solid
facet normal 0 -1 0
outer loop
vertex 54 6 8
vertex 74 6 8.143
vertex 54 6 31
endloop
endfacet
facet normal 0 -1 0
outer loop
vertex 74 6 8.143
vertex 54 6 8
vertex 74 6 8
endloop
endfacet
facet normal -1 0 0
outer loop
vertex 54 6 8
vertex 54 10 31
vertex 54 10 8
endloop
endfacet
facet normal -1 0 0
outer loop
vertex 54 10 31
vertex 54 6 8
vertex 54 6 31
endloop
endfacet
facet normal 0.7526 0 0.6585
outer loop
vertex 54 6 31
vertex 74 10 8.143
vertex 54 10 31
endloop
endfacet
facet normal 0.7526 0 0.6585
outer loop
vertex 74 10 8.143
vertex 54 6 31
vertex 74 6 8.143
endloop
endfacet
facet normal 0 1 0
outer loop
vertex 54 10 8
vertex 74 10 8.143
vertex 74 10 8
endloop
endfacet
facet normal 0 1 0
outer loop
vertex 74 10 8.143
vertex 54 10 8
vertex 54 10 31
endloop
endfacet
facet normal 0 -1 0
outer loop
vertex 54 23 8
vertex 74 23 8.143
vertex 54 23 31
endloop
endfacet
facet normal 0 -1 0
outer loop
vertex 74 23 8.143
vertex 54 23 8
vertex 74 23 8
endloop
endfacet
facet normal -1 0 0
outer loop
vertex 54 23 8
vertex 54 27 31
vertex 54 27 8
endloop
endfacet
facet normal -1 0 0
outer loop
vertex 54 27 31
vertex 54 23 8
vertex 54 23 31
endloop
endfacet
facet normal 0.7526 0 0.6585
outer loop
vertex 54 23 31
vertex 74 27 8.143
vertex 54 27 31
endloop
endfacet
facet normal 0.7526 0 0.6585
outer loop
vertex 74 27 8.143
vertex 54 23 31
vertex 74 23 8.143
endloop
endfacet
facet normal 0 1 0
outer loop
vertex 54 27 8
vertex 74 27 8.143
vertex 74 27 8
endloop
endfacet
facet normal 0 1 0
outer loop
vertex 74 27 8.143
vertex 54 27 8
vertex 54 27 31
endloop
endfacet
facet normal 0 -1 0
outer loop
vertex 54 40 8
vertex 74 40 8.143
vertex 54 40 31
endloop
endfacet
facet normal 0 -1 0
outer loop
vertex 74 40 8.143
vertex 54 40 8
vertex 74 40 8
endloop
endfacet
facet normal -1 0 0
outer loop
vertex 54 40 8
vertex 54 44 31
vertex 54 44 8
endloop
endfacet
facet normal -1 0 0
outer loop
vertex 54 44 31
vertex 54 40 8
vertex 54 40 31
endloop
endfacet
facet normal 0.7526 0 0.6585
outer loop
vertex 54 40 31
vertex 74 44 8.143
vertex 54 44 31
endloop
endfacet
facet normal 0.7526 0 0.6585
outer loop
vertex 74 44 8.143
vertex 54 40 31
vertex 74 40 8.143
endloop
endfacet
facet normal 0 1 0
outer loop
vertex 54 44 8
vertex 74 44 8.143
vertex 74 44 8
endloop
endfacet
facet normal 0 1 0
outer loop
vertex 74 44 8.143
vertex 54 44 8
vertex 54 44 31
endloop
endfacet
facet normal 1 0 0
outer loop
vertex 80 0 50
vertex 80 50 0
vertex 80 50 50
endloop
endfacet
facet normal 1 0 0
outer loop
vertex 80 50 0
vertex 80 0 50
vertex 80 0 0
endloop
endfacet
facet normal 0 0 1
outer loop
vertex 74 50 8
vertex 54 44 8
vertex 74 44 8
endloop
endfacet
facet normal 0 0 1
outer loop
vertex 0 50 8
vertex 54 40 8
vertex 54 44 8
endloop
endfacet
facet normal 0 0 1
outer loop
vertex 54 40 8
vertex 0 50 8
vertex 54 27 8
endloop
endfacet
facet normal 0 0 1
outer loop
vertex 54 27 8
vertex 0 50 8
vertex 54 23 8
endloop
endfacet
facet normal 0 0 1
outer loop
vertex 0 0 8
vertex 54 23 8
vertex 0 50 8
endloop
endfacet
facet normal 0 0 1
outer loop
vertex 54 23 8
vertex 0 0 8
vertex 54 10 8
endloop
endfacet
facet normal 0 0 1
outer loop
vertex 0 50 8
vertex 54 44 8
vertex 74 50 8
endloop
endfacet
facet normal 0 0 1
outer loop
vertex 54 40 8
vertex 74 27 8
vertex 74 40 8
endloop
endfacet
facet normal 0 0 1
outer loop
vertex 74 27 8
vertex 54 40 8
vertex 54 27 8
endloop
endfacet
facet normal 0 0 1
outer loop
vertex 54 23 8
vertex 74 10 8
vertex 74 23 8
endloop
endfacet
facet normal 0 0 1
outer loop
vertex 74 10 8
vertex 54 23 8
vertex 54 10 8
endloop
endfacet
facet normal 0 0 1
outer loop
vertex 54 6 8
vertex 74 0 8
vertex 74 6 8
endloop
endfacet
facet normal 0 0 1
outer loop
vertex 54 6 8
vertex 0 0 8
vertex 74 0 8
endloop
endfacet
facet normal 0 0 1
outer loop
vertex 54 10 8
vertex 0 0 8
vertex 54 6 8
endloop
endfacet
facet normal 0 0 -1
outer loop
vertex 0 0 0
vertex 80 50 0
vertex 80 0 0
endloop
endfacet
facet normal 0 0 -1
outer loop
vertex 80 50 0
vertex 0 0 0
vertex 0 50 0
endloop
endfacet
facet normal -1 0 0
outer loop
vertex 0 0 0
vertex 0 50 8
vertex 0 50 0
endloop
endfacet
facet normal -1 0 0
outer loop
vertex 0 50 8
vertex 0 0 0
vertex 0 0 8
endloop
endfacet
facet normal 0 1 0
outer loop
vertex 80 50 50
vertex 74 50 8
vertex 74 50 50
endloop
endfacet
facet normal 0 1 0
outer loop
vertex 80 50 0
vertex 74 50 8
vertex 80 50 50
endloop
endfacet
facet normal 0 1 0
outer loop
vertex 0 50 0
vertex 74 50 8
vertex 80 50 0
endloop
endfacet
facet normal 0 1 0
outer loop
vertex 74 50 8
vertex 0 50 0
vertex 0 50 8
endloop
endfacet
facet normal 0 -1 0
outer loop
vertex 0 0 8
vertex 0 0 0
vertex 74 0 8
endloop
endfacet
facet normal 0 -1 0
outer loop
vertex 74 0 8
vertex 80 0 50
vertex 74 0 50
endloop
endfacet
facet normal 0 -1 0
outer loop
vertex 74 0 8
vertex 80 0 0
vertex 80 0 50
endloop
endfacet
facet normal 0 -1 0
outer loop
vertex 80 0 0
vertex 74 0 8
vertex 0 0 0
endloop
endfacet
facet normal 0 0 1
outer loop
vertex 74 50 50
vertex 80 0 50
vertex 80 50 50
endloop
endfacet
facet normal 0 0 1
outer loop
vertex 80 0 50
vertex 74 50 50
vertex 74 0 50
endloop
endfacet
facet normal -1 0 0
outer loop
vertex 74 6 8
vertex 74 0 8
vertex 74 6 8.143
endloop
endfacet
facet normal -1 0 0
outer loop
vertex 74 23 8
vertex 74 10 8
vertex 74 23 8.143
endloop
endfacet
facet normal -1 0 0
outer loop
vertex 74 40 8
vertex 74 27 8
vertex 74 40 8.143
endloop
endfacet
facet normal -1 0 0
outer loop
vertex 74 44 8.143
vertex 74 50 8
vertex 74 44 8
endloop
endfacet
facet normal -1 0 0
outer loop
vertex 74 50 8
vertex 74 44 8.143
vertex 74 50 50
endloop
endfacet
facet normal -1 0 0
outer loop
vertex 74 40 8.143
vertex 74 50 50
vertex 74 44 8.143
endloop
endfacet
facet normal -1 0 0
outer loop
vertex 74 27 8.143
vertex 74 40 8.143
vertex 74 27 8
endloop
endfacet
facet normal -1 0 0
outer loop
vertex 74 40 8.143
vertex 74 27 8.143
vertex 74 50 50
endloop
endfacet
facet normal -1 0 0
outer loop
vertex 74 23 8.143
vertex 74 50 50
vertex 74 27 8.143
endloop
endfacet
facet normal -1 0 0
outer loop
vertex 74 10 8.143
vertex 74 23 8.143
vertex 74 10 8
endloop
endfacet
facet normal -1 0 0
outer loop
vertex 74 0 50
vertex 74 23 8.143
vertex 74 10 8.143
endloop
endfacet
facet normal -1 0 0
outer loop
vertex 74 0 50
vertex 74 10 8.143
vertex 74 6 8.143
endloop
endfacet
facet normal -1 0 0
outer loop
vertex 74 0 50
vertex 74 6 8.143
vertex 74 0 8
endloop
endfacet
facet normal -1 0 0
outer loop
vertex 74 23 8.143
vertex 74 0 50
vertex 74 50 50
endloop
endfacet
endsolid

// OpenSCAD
$fn = 32;

// ----------------------------------------------------------------------
// Rib bracket: 3-gusset L bracket
// ----------------------------------------------------------------------

// --- parameters (mm) ---
base_l = 80;              // foot length, X
base_w = 50;              // foot width, Y
base_t = 8;               // foot thickness
plate_t = 6;              // upright plate thickness
plate_h = 50;             // overall height
gus_l = 20;               // gusset leg along the foot
gus_h = 24;               // gusset height
gus_t = 4;                // gusset thickness
gus_edge = 6;             // gusset margin from the foot edge
n_gus = 3;                // gusset count
fit_tol = 0.1;            // tolerance for press fits, mm
free_tol = 0.5;           // tolerance for clearance fits, mm

gus_pitch = (base_w - 2 * gus_edge - gus_t) / (n_gus - 1);  // gusset pitch

union() {
  cube([base_l, base_w, base_t]);
  translate([base_l - plate_t, 0, base_t - 1])
    cube([plate_t, base_w, plate_h - base_t + 1]);
  for (i = [0 : n_gus - 1])
    translate([base_l - plate_t - gus_l, gus_edge + i * gus_pitch, base_t - 1])
      rotate([-90, 0, 0])
        linear_extrude(height = gus_t)
          polygon(points = [[0, 0], [gus_l + 1, 0], [0, -gus_h]]);
}
